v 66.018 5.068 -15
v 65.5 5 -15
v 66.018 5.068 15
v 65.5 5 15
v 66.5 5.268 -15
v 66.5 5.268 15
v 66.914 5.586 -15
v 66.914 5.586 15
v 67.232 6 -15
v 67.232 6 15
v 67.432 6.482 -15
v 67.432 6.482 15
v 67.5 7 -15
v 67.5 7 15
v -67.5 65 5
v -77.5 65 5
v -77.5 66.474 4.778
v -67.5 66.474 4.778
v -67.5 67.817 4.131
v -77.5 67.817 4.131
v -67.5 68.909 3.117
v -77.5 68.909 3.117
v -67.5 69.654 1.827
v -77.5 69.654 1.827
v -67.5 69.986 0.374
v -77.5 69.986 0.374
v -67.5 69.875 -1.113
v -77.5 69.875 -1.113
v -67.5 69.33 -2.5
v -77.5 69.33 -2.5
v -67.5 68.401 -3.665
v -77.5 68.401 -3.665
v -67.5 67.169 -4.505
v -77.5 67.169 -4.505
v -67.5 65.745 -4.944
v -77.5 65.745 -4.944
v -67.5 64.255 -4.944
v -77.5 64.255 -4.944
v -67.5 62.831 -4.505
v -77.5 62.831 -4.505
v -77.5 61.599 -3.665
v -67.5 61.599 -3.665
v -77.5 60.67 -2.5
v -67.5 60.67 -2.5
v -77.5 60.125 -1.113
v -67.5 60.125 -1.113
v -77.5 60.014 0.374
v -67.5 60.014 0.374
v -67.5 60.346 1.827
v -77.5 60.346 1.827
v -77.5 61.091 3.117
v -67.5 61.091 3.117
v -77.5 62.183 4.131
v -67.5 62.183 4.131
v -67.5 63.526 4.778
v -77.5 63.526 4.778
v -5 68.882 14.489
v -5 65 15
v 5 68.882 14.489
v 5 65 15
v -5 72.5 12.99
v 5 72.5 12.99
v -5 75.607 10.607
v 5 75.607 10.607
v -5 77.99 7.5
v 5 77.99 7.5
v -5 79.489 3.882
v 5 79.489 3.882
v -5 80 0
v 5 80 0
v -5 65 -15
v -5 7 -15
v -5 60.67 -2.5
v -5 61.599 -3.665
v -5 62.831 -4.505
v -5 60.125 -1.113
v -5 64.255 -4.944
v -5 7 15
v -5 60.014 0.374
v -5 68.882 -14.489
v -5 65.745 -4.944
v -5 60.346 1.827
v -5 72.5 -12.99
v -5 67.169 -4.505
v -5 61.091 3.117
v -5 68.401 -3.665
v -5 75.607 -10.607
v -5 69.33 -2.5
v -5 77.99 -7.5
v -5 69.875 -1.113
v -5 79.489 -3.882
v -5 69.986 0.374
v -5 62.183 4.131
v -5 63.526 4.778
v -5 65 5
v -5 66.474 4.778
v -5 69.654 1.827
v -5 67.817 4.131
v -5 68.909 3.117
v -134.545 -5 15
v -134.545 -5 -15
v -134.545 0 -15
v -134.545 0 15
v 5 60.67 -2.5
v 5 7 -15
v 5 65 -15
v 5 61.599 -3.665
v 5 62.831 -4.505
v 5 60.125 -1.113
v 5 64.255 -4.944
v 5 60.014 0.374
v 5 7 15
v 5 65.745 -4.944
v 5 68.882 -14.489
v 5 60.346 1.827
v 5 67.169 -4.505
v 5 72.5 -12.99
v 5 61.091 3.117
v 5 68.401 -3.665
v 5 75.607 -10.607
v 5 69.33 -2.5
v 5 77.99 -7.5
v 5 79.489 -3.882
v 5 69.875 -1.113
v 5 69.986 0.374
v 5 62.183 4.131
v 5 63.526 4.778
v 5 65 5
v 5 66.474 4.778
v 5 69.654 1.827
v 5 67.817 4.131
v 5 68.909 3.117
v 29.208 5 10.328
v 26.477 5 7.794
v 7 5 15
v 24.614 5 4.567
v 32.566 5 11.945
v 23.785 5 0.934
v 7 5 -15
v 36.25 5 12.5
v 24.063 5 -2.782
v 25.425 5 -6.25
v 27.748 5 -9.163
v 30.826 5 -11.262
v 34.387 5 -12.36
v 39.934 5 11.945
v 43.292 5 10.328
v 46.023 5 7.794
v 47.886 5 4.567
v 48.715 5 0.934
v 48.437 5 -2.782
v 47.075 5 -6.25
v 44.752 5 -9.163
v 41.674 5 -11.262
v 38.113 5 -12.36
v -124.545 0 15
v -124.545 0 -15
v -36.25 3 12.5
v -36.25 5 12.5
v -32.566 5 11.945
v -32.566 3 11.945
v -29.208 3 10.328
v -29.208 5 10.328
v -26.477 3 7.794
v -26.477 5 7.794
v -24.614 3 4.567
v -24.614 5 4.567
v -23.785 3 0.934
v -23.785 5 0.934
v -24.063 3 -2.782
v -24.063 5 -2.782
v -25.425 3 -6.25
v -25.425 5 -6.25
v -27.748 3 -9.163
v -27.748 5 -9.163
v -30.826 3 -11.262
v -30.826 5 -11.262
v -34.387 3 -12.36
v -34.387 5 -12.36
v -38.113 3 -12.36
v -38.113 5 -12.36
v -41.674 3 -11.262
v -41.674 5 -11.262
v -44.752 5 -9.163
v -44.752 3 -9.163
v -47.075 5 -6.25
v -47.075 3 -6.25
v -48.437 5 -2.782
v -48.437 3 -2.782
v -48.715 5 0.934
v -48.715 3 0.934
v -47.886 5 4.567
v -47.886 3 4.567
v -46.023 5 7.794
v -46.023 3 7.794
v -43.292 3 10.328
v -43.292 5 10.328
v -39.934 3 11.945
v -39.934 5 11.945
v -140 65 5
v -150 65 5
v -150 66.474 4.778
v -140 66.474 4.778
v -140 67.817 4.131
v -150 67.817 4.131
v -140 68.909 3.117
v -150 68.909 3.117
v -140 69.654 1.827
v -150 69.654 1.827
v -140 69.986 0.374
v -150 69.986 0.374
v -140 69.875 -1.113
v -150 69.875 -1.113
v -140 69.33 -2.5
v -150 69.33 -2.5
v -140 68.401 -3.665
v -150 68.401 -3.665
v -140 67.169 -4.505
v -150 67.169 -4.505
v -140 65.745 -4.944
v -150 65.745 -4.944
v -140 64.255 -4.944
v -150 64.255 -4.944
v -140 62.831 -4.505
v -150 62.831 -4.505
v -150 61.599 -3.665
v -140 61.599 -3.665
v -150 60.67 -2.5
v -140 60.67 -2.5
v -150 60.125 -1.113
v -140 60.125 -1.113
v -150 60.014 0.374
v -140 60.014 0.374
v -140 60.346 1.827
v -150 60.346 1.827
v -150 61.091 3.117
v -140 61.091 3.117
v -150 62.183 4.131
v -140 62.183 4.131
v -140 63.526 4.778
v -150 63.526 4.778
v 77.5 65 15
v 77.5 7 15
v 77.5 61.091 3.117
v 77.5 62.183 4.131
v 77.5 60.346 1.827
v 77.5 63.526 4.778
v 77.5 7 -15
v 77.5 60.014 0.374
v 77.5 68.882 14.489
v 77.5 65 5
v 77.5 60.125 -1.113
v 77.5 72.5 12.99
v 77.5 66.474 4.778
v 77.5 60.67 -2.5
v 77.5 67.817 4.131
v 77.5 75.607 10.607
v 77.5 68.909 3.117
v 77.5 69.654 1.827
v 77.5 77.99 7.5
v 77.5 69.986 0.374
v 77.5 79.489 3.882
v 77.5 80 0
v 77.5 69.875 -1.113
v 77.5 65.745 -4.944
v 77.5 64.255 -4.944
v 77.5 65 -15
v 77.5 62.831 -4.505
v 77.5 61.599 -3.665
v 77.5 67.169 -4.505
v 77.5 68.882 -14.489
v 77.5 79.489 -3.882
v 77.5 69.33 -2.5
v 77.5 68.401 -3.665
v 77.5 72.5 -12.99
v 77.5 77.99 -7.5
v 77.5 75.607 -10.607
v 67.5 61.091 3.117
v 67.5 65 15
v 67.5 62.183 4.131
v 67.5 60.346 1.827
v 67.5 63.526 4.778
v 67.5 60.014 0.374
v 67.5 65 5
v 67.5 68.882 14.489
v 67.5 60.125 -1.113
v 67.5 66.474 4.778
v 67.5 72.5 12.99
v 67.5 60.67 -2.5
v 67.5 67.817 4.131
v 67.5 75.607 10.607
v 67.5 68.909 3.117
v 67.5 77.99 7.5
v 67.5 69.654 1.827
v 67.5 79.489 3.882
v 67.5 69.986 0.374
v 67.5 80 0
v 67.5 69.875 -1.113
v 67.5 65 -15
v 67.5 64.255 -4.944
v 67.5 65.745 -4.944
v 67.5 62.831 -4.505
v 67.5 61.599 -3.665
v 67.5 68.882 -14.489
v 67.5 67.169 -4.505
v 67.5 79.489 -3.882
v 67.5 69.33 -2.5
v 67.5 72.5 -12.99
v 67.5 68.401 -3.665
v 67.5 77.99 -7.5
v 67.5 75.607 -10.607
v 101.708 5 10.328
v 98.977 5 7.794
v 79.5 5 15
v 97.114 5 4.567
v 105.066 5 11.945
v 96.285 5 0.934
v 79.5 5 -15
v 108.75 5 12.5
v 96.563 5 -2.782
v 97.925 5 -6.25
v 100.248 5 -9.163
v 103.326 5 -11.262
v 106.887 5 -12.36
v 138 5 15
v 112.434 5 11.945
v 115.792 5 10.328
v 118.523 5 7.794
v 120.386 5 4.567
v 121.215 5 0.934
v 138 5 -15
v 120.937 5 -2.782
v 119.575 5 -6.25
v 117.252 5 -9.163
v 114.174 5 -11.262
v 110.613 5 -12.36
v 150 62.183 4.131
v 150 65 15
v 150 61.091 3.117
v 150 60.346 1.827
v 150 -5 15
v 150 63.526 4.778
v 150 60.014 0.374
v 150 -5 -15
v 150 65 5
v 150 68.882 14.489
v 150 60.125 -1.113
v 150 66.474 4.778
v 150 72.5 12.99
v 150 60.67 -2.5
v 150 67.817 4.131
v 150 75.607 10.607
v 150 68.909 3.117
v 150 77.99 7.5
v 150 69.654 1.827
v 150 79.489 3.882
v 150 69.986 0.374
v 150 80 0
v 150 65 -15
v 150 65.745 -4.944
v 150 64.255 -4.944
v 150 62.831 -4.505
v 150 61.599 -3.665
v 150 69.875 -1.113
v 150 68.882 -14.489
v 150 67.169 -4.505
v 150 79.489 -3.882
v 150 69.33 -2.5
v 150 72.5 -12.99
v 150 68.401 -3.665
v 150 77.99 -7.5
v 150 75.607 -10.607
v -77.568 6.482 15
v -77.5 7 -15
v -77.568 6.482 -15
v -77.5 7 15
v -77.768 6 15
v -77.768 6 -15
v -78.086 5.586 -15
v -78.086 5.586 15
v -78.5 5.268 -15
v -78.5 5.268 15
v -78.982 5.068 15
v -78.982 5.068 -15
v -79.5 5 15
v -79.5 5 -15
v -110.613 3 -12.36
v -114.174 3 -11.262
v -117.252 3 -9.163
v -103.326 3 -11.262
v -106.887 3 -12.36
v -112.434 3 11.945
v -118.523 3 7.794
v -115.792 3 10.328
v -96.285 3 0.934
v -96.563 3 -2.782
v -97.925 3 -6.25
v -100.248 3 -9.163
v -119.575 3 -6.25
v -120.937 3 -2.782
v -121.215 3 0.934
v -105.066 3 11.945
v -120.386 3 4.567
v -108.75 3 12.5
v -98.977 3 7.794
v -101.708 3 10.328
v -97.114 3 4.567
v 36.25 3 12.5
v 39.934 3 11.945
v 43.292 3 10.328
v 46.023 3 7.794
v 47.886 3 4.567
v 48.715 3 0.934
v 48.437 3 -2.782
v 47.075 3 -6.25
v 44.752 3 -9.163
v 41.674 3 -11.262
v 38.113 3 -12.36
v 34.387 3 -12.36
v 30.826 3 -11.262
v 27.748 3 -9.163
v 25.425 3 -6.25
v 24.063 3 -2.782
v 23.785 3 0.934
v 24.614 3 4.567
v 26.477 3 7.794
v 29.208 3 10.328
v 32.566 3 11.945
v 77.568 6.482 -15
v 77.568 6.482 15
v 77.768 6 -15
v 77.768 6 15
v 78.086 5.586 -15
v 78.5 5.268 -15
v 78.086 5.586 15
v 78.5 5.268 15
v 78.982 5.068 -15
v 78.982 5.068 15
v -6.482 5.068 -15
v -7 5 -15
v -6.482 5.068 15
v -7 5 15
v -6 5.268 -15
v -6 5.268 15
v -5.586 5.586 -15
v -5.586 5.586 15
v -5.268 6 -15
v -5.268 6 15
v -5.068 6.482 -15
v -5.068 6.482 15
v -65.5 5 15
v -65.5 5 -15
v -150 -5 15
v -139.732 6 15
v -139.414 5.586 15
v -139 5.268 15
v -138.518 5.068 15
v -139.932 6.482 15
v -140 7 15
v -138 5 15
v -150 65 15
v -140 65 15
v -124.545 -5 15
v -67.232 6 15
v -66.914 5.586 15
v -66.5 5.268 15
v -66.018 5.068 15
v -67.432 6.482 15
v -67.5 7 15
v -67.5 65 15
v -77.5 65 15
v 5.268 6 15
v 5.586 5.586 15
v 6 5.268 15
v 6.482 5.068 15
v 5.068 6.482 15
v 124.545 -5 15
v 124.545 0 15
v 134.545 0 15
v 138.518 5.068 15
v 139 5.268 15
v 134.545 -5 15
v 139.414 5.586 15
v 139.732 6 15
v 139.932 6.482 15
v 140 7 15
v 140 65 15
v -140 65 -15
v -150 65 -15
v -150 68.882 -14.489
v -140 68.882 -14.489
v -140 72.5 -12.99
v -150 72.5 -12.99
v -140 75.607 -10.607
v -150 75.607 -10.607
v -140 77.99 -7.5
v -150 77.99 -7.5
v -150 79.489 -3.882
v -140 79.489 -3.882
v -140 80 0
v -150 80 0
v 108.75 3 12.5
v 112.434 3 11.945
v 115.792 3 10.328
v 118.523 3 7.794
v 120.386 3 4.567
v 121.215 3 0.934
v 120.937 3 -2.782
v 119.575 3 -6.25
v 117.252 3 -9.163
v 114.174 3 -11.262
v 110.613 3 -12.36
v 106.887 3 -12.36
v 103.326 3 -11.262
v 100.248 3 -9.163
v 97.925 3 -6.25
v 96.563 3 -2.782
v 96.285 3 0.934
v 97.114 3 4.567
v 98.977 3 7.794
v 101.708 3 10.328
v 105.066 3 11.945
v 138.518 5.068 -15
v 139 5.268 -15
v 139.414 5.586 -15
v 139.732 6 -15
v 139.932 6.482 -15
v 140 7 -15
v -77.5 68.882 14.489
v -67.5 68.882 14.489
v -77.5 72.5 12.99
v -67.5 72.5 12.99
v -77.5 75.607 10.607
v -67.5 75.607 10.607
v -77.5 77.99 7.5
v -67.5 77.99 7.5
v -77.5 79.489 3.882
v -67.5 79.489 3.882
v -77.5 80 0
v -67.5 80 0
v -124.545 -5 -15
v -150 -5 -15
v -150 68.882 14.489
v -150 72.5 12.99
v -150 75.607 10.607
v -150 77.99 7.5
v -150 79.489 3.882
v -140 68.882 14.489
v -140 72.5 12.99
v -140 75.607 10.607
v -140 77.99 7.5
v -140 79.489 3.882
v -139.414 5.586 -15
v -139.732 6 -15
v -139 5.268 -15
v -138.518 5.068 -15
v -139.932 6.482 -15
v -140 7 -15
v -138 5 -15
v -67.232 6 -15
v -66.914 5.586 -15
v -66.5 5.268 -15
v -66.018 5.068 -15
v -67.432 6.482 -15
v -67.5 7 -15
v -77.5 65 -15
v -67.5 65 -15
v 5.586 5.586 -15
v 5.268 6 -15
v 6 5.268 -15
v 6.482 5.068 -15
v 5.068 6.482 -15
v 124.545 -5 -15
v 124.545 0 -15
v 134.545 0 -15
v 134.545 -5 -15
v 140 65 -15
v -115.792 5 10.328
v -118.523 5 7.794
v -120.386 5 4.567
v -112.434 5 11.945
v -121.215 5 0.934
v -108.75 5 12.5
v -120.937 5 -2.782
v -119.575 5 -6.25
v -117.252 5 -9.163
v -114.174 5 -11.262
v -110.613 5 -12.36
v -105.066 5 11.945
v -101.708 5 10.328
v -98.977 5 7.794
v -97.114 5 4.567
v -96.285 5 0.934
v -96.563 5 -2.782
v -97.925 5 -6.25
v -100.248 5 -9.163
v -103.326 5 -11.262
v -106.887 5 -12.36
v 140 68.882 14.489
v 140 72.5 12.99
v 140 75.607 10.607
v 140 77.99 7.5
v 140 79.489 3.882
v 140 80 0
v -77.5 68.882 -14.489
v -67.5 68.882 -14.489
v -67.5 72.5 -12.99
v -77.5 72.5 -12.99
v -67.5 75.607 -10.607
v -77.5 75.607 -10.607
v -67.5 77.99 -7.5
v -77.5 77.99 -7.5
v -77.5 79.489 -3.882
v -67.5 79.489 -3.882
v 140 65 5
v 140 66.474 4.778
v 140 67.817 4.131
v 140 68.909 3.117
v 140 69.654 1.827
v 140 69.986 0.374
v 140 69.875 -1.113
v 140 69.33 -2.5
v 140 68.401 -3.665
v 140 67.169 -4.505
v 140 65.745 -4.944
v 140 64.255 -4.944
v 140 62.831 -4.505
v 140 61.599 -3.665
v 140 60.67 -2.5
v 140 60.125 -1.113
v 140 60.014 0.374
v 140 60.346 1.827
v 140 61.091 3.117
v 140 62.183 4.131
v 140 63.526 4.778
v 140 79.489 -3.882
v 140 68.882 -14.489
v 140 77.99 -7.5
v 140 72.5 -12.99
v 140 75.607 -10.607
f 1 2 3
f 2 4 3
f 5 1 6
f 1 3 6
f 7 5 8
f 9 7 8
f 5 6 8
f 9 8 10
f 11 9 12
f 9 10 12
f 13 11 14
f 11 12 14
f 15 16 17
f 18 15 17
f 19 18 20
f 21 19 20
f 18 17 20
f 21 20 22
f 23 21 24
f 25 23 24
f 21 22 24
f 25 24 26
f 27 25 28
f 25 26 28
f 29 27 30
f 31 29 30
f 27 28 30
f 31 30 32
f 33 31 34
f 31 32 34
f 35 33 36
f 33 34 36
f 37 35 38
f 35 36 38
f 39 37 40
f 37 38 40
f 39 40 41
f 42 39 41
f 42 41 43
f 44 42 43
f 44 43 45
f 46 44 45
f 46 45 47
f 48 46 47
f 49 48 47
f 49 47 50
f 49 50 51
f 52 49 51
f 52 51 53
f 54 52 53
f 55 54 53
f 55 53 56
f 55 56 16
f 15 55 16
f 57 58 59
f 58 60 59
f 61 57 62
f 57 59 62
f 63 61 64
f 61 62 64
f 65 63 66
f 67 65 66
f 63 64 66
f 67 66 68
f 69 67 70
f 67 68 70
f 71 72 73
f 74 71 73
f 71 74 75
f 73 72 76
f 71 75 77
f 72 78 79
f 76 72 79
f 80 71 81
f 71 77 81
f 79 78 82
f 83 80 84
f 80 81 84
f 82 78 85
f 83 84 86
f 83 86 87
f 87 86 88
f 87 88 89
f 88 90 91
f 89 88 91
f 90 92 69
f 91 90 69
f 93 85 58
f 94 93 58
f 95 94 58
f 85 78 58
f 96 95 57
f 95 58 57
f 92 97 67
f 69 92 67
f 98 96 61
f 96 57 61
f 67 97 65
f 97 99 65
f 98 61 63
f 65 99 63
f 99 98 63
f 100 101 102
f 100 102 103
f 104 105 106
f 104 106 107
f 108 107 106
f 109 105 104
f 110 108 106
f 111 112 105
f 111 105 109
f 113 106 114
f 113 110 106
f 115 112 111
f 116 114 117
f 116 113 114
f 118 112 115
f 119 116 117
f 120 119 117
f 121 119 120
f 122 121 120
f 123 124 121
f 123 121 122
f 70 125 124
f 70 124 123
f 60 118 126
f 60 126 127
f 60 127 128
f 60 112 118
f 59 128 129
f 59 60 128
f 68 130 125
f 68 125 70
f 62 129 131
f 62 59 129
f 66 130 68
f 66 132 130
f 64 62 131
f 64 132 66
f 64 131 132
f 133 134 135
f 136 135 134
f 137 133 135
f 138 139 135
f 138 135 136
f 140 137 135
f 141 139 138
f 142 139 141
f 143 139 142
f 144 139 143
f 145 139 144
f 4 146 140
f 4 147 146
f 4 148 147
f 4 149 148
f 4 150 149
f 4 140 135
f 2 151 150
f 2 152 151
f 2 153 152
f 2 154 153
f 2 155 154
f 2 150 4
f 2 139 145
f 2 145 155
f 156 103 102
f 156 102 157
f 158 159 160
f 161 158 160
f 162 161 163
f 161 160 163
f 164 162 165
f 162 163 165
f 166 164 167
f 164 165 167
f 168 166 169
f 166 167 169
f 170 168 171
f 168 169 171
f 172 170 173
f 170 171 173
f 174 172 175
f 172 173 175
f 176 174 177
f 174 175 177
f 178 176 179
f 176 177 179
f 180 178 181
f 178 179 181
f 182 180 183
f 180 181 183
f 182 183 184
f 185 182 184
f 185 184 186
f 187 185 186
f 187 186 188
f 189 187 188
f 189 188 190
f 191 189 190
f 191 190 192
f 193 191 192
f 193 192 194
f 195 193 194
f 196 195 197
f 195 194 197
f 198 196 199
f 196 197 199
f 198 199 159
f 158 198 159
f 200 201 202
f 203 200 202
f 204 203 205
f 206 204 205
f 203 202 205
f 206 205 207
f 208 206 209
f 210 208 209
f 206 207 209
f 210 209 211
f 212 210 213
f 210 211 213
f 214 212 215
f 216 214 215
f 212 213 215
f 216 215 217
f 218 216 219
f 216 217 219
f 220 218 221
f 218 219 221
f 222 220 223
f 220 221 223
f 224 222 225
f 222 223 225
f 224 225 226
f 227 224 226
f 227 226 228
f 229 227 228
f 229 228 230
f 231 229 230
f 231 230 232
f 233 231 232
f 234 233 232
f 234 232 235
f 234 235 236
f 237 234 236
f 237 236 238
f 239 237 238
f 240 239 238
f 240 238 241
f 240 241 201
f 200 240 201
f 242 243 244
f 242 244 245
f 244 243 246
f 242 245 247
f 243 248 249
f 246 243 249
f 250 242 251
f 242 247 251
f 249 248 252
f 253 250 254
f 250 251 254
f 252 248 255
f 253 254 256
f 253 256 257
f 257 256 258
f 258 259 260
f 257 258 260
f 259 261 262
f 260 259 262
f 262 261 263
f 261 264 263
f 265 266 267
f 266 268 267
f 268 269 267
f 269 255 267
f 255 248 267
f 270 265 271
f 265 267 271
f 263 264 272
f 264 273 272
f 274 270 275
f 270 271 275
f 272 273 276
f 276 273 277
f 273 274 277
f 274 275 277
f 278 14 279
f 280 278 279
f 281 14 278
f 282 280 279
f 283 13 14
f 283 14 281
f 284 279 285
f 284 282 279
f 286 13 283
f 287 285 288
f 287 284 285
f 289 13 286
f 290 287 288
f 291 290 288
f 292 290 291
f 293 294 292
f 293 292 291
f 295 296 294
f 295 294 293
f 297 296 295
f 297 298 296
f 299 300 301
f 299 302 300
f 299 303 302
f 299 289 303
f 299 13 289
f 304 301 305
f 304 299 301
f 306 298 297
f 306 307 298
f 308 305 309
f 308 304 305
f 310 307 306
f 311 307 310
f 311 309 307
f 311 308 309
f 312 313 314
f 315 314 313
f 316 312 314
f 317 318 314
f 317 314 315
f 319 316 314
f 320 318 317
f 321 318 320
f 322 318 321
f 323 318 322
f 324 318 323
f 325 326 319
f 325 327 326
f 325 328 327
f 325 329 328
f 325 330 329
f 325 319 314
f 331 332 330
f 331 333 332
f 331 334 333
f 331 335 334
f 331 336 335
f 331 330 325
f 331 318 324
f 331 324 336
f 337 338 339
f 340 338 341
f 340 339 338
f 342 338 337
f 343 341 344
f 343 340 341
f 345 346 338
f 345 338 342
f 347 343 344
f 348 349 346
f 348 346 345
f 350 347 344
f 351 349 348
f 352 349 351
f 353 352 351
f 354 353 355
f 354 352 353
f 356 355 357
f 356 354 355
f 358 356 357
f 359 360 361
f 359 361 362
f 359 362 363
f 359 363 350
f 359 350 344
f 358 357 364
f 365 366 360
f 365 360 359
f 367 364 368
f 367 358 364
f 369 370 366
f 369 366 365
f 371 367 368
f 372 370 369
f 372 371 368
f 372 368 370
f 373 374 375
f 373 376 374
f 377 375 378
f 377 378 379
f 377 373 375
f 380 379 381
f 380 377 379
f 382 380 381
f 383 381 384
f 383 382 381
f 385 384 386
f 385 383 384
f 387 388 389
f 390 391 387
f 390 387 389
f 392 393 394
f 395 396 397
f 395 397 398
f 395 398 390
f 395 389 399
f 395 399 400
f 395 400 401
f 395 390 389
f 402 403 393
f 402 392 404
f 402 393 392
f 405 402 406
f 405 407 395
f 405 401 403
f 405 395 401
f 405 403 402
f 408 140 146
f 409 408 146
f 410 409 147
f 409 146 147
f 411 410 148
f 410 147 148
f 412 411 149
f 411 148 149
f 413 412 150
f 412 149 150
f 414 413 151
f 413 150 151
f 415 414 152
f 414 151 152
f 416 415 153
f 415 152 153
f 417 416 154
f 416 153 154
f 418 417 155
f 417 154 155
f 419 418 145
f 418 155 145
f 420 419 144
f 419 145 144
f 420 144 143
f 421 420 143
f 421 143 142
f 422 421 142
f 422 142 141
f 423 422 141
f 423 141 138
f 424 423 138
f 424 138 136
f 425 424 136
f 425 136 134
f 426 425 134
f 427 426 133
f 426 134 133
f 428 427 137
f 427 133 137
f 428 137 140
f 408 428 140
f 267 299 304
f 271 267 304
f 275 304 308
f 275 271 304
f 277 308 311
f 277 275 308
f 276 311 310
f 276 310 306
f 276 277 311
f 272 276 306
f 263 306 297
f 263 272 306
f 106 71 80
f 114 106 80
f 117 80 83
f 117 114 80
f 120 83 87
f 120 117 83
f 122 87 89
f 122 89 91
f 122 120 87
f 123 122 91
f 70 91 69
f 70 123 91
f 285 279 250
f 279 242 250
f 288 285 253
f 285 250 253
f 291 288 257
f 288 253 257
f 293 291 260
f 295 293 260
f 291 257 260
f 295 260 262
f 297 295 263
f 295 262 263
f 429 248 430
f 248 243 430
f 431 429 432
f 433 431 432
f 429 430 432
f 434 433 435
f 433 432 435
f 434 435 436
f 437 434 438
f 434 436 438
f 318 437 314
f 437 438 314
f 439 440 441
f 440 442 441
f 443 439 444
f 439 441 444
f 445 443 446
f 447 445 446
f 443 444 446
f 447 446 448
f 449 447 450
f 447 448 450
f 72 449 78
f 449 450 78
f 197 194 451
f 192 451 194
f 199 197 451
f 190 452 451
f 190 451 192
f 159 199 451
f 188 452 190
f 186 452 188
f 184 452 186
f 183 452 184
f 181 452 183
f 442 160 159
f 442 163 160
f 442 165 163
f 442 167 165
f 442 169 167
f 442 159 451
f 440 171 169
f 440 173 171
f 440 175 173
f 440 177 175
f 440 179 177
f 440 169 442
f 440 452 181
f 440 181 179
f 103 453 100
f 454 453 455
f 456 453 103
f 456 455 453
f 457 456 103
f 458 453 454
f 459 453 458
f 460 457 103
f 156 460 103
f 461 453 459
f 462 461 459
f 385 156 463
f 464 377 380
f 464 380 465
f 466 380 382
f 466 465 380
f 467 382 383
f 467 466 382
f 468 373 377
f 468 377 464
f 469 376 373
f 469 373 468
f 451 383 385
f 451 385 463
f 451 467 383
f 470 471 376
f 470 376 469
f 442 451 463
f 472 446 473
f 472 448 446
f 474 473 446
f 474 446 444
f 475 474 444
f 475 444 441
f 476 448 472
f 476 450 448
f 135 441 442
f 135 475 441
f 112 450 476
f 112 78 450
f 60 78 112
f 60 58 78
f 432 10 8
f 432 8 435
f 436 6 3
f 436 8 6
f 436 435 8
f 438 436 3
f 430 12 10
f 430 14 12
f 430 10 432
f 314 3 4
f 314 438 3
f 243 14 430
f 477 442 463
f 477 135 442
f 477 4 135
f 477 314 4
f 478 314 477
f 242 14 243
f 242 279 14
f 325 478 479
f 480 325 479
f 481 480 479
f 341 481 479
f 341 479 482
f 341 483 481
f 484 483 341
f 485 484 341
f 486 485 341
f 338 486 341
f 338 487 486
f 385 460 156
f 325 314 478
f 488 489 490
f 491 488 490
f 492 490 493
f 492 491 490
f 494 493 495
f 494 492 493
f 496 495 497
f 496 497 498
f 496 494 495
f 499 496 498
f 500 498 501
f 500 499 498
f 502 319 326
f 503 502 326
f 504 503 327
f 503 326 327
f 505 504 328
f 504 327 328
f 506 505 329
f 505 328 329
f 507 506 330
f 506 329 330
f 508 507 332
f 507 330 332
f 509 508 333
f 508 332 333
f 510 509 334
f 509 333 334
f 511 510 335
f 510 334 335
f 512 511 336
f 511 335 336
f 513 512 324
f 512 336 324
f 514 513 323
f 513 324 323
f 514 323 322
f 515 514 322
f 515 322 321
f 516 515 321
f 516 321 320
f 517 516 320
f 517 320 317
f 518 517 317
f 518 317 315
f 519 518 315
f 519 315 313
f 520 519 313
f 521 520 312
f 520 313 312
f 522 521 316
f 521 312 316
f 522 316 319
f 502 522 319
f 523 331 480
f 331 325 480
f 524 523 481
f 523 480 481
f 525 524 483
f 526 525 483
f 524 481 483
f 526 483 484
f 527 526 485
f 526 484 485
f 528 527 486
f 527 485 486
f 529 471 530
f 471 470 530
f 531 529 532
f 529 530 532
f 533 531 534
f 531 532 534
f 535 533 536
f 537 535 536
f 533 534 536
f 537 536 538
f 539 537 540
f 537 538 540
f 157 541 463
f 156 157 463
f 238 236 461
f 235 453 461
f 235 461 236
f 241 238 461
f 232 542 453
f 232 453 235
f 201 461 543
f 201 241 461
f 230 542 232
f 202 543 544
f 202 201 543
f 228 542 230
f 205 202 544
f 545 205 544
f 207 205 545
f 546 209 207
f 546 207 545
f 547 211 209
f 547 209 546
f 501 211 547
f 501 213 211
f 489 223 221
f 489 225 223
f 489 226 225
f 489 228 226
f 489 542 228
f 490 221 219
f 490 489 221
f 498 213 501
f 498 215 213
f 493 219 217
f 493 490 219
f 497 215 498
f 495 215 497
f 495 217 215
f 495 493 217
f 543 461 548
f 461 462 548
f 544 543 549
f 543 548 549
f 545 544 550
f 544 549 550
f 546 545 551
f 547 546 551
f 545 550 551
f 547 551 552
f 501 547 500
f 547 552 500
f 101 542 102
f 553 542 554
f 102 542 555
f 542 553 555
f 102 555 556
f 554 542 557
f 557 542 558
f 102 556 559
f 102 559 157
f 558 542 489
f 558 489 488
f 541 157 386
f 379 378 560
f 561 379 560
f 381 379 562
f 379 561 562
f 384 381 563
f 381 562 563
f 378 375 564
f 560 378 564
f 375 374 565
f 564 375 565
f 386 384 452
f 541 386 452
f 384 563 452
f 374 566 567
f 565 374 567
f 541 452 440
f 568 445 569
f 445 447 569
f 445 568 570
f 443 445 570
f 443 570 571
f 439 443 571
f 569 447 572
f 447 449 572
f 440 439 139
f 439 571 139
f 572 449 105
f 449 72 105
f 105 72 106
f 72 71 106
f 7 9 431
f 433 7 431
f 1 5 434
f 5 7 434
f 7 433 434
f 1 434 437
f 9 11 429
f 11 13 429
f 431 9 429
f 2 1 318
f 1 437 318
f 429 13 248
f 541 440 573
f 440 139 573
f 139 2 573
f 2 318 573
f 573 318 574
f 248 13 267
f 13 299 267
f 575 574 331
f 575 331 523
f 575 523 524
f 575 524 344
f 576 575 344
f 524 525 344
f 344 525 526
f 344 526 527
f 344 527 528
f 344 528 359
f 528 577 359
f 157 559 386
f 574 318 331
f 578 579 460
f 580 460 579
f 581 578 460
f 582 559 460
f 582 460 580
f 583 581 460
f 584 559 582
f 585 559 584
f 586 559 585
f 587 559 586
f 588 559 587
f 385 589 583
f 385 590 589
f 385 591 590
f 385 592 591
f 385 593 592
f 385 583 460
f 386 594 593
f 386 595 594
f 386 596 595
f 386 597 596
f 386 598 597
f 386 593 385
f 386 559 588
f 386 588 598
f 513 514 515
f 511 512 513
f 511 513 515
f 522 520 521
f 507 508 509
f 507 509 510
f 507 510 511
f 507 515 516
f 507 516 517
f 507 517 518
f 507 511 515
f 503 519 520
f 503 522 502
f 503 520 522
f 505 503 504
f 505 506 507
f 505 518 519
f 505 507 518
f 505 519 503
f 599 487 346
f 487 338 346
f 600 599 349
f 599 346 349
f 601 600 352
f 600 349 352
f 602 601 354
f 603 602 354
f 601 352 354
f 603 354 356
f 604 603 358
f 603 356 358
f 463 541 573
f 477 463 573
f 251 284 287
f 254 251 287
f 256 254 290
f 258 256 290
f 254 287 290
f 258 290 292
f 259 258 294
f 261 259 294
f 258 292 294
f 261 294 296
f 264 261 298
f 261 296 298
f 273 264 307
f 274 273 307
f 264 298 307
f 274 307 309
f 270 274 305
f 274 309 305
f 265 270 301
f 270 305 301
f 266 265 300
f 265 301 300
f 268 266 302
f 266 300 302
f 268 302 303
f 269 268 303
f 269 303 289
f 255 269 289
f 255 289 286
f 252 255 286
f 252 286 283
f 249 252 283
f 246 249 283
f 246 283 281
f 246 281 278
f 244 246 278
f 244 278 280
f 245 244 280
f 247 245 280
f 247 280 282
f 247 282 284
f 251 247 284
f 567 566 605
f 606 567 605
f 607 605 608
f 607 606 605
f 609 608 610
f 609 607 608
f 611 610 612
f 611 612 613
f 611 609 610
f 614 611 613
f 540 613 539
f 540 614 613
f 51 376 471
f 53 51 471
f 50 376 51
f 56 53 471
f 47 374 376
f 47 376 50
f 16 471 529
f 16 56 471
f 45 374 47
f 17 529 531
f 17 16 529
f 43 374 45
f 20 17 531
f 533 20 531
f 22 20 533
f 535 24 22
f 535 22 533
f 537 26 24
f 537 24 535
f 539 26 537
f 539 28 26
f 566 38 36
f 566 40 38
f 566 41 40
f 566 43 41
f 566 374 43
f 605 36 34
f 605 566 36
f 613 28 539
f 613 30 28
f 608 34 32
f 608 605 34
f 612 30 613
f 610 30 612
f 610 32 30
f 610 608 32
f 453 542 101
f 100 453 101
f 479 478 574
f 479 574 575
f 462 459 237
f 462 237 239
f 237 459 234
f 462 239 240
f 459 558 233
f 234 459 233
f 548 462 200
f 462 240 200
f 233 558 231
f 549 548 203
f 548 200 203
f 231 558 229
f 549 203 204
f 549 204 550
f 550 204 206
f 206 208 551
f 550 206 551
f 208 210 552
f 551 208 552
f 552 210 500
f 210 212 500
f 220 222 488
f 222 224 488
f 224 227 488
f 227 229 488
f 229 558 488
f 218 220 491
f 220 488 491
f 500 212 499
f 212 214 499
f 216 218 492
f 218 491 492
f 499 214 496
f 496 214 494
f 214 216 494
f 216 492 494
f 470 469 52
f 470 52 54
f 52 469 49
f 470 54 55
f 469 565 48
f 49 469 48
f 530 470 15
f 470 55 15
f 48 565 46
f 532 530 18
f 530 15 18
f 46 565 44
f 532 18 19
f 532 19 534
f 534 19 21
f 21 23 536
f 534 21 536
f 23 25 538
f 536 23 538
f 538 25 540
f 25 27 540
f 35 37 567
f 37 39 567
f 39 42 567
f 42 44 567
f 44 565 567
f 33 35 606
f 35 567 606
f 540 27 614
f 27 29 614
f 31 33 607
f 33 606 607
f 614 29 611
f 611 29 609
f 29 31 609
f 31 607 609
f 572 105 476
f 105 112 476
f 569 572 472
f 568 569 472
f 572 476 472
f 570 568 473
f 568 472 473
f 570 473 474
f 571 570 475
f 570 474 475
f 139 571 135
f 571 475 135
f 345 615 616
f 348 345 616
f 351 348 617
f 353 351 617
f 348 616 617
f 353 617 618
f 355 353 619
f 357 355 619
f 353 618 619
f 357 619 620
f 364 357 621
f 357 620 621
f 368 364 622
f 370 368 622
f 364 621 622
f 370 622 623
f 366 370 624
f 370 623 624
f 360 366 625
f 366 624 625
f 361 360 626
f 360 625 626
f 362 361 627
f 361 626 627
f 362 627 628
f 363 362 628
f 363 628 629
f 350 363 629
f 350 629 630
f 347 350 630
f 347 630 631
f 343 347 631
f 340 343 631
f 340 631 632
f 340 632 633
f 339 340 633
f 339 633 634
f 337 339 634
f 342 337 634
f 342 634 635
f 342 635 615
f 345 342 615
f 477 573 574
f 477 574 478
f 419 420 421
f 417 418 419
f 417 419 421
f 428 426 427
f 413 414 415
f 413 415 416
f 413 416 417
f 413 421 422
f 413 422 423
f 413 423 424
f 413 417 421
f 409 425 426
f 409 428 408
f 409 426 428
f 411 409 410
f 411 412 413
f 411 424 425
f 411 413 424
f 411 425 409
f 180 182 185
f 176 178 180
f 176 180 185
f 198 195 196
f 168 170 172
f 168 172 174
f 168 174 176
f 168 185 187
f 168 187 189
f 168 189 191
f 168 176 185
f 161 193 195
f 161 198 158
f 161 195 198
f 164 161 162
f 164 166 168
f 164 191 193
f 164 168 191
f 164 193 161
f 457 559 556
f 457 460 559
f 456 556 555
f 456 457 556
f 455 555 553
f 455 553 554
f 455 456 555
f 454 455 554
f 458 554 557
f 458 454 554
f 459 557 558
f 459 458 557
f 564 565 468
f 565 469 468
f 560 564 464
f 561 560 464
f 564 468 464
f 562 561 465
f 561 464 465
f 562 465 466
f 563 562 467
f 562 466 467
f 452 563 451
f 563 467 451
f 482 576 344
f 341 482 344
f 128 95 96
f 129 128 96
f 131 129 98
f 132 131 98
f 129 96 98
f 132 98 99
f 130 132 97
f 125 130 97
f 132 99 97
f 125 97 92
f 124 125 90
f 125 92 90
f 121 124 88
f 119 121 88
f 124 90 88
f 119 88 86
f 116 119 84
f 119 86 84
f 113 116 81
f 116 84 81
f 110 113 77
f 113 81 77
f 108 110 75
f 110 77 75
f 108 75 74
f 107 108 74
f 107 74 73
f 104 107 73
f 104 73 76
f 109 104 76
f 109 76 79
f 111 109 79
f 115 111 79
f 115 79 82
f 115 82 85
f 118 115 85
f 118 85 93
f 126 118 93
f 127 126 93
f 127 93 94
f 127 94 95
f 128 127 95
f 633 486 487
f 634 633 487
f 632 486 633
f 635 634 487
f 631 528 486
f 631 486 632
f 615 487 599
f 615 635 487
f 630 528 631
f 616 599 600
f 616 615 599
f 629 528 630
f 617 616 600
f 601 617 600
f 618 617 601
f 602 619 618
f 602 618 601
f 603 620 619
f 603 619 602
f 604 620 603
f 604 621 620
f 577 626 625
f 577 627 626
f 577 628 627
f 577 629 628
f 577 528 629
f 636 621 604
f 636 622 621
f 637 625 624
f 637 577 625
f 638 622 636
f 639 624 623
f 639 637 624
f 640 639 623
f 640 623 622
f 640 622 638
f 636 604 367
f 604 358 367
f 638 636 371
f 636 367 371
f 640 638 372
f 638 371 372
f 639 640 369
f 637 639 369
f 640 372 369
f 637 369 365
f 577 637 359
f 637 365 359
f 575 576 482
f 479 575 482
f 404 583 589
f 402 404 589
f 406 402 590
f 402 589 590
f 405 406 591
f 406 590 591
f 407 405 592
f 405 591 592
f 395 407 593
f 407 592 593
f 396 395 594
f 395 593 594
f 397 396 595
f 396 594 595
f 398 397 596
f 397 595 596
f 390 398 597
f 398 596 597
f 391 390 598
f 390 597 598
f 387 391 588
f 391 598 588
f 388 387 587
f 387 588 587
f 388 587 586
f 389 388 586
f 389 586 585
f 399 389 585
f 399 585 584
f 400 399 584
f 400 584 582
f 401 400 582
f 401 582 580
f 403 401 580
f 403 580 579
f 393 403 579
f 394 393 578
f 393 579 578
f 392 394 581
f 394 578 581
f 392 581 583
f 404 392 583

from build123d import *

# Parameters (mm, degrees)
SKETCH1_W            = 300
SKETCH1_H            = 30
BOSS_EXTRUDE1_DEPTH  = 5
SKETCH2_W            = 10
SKETCH2_H            = 30
CUT_EXTRUDE1_DEPTH   = 5
SKETCH3_W            = 10
SKETCH3_H            = 75
BOSS_EXTRUDE2_DEPTH  = 15
FILLET1_R            = 15
SKETCH4_R            = 5
CUT_EXTRUDE2_DEPTH   = 311.845620847
FILLET2_R            = 15
FILLET3_R            = 2
SKETCH5_R            = 12.5
CUT_EXTRUDE3_DEPTH   = 2
LPATTERN1_COUNT      = 3
LPATTERN1_PITCH      = 72.5
LPATTERN1_COUNT_DIR2 = 3
LPATTERN1_PITCH_DIR2 = 72.5


with BuildPart() as part:
    # Sketch1 → Boss-Extrude1 (new, symmetric)
    with BuildSketch(Plane(origin=(0, 0, 0), x_dir=(1, 0, 0), z_dir=(0, 1, 0))):
        Rectangle(SKETCH1_W, SKETCH1_H)
    extrude(amount=BOSS_EXTRUDE1_DEPTH, both=True)

    # Sketch2 → Cut-Extrude1 (cut)
    with BuildSketch(Plane.XZ.offset(5)):
        with Locations((-129.545, 0)):
            Rectangle(SKETCH2_W, SKETCH2_H)
        with Locations((129.545, 0)):
            Rectangle(SKETCH2_W, SKETCH2_H)
    extrude(amount=-CUT_EXTRUDE1_DEPTH, mode=Mode.SUBTRACT)

    # Sketch3 → Boss-Extrude2 (add, symmetric)
    with BuildSketch(Plane.XY):
        with Locations((-145, 42.5)):
            Rectangle(SKETCH3_W, SKETCH3_H)
        with Locations((145, 42.5)):
            Rectangle(SKETCH3_W, SKETCH3_H)
        with Locations((-72.5, 42.5)):
            Rectangle(SKETCH3_W, SKETCH3_H)
        with Locations((72.5, 42.5)):
            Rectangle(SKETCH3_W, SKETCH3_H)
        with Locations((0, 42.5)):
            Rectangle(SKETCH3_W, SKETCH3_H)
    extrude(amount=BOSS_EXTRUDE2_DEPTH, both=True)

    # Fillet1
    fillet1_edges = [part.edges().sort_by_distance(p)[0] for p in [
        (145, 80, -15),
        (145, 80, 15),
        (-145, 80, -15),
        (-145, 80, 15),
    ]]
    fillet(fillet1_edges, radius=FILLET1_R - 0.0001)  # a hair under: the kernel refuses the full size

    # Sketch4 → Cut-Extrude2 (cut, through all)
    with BuildSketch(Plane.ZY.offset(150)):
        with Locations((0, 65)):
            Circle(SKETCH4_R)
    extrude(amount=-CUT_EXTRUDE2_DEPTH, mode=Mode.SUBTRACT)

    # Fillet2
    fillet2_edges = [part.edges().sort_by_distance(p)[0] for p in [
        (72.5, 80, -15),
        (72.5, 80, 15),
        (0, 80, -15),
        (0, 80, 15),
        (-72.5, 80, -15),
        (-72.5, 80, 15),
    ]]
    fillet(fillet2_edges, radius=FILLET2_R - 0.0001)  # a hair under: the kernel refuses the full size

    # Fillet3
    fillet3_edges = [part.edges().sort_by_distance(p)[0] for p in [
        (-140, 5, 0),
        (140, 5, 0),
        (-77.5, 5, 0),
        (-67.5, 5, 0),
        (67.5, 5, 0),
        (77.5, 5, 0),
        (-5, 5, 0),
        (5, 5, 0),
    ]]
    fillet(fillet3_edges, radius=FILLET3_R)

    # Sketch5 → Cut-Extrude3 (cut)
    with BuildSketch(Plane(origin=(0, 5, 0), x_dir=(1, 0, 0), z_dir=(0, 1, 0))):
        with Locations(Location((36.25, 0, 0), (0, 0, 270))):
            Circle(SKETCH5_R)
    cut_extrude3 = extrude(amount=-CUT_EXTRUDE3_DEPTH, mode=Mode.SUBTRACT)

    # LPattern1: Cut-Extrude3 3 × 3
    with Locations(*[Vector(-1, 0, 0) * (i * LPATTERN1_PITCH) + Vector(1, 0, 0) * (j * LPATTERN1_PITCH_DIR2) for i in range(LPATTERN1_COUNT) for j in range(LPATTERN1_COUNT_DIR2) if (i, j) != (0, 0)]):
        add(cut_extrude3, mode=Mode.SUBTRACT)


solid = part.part
